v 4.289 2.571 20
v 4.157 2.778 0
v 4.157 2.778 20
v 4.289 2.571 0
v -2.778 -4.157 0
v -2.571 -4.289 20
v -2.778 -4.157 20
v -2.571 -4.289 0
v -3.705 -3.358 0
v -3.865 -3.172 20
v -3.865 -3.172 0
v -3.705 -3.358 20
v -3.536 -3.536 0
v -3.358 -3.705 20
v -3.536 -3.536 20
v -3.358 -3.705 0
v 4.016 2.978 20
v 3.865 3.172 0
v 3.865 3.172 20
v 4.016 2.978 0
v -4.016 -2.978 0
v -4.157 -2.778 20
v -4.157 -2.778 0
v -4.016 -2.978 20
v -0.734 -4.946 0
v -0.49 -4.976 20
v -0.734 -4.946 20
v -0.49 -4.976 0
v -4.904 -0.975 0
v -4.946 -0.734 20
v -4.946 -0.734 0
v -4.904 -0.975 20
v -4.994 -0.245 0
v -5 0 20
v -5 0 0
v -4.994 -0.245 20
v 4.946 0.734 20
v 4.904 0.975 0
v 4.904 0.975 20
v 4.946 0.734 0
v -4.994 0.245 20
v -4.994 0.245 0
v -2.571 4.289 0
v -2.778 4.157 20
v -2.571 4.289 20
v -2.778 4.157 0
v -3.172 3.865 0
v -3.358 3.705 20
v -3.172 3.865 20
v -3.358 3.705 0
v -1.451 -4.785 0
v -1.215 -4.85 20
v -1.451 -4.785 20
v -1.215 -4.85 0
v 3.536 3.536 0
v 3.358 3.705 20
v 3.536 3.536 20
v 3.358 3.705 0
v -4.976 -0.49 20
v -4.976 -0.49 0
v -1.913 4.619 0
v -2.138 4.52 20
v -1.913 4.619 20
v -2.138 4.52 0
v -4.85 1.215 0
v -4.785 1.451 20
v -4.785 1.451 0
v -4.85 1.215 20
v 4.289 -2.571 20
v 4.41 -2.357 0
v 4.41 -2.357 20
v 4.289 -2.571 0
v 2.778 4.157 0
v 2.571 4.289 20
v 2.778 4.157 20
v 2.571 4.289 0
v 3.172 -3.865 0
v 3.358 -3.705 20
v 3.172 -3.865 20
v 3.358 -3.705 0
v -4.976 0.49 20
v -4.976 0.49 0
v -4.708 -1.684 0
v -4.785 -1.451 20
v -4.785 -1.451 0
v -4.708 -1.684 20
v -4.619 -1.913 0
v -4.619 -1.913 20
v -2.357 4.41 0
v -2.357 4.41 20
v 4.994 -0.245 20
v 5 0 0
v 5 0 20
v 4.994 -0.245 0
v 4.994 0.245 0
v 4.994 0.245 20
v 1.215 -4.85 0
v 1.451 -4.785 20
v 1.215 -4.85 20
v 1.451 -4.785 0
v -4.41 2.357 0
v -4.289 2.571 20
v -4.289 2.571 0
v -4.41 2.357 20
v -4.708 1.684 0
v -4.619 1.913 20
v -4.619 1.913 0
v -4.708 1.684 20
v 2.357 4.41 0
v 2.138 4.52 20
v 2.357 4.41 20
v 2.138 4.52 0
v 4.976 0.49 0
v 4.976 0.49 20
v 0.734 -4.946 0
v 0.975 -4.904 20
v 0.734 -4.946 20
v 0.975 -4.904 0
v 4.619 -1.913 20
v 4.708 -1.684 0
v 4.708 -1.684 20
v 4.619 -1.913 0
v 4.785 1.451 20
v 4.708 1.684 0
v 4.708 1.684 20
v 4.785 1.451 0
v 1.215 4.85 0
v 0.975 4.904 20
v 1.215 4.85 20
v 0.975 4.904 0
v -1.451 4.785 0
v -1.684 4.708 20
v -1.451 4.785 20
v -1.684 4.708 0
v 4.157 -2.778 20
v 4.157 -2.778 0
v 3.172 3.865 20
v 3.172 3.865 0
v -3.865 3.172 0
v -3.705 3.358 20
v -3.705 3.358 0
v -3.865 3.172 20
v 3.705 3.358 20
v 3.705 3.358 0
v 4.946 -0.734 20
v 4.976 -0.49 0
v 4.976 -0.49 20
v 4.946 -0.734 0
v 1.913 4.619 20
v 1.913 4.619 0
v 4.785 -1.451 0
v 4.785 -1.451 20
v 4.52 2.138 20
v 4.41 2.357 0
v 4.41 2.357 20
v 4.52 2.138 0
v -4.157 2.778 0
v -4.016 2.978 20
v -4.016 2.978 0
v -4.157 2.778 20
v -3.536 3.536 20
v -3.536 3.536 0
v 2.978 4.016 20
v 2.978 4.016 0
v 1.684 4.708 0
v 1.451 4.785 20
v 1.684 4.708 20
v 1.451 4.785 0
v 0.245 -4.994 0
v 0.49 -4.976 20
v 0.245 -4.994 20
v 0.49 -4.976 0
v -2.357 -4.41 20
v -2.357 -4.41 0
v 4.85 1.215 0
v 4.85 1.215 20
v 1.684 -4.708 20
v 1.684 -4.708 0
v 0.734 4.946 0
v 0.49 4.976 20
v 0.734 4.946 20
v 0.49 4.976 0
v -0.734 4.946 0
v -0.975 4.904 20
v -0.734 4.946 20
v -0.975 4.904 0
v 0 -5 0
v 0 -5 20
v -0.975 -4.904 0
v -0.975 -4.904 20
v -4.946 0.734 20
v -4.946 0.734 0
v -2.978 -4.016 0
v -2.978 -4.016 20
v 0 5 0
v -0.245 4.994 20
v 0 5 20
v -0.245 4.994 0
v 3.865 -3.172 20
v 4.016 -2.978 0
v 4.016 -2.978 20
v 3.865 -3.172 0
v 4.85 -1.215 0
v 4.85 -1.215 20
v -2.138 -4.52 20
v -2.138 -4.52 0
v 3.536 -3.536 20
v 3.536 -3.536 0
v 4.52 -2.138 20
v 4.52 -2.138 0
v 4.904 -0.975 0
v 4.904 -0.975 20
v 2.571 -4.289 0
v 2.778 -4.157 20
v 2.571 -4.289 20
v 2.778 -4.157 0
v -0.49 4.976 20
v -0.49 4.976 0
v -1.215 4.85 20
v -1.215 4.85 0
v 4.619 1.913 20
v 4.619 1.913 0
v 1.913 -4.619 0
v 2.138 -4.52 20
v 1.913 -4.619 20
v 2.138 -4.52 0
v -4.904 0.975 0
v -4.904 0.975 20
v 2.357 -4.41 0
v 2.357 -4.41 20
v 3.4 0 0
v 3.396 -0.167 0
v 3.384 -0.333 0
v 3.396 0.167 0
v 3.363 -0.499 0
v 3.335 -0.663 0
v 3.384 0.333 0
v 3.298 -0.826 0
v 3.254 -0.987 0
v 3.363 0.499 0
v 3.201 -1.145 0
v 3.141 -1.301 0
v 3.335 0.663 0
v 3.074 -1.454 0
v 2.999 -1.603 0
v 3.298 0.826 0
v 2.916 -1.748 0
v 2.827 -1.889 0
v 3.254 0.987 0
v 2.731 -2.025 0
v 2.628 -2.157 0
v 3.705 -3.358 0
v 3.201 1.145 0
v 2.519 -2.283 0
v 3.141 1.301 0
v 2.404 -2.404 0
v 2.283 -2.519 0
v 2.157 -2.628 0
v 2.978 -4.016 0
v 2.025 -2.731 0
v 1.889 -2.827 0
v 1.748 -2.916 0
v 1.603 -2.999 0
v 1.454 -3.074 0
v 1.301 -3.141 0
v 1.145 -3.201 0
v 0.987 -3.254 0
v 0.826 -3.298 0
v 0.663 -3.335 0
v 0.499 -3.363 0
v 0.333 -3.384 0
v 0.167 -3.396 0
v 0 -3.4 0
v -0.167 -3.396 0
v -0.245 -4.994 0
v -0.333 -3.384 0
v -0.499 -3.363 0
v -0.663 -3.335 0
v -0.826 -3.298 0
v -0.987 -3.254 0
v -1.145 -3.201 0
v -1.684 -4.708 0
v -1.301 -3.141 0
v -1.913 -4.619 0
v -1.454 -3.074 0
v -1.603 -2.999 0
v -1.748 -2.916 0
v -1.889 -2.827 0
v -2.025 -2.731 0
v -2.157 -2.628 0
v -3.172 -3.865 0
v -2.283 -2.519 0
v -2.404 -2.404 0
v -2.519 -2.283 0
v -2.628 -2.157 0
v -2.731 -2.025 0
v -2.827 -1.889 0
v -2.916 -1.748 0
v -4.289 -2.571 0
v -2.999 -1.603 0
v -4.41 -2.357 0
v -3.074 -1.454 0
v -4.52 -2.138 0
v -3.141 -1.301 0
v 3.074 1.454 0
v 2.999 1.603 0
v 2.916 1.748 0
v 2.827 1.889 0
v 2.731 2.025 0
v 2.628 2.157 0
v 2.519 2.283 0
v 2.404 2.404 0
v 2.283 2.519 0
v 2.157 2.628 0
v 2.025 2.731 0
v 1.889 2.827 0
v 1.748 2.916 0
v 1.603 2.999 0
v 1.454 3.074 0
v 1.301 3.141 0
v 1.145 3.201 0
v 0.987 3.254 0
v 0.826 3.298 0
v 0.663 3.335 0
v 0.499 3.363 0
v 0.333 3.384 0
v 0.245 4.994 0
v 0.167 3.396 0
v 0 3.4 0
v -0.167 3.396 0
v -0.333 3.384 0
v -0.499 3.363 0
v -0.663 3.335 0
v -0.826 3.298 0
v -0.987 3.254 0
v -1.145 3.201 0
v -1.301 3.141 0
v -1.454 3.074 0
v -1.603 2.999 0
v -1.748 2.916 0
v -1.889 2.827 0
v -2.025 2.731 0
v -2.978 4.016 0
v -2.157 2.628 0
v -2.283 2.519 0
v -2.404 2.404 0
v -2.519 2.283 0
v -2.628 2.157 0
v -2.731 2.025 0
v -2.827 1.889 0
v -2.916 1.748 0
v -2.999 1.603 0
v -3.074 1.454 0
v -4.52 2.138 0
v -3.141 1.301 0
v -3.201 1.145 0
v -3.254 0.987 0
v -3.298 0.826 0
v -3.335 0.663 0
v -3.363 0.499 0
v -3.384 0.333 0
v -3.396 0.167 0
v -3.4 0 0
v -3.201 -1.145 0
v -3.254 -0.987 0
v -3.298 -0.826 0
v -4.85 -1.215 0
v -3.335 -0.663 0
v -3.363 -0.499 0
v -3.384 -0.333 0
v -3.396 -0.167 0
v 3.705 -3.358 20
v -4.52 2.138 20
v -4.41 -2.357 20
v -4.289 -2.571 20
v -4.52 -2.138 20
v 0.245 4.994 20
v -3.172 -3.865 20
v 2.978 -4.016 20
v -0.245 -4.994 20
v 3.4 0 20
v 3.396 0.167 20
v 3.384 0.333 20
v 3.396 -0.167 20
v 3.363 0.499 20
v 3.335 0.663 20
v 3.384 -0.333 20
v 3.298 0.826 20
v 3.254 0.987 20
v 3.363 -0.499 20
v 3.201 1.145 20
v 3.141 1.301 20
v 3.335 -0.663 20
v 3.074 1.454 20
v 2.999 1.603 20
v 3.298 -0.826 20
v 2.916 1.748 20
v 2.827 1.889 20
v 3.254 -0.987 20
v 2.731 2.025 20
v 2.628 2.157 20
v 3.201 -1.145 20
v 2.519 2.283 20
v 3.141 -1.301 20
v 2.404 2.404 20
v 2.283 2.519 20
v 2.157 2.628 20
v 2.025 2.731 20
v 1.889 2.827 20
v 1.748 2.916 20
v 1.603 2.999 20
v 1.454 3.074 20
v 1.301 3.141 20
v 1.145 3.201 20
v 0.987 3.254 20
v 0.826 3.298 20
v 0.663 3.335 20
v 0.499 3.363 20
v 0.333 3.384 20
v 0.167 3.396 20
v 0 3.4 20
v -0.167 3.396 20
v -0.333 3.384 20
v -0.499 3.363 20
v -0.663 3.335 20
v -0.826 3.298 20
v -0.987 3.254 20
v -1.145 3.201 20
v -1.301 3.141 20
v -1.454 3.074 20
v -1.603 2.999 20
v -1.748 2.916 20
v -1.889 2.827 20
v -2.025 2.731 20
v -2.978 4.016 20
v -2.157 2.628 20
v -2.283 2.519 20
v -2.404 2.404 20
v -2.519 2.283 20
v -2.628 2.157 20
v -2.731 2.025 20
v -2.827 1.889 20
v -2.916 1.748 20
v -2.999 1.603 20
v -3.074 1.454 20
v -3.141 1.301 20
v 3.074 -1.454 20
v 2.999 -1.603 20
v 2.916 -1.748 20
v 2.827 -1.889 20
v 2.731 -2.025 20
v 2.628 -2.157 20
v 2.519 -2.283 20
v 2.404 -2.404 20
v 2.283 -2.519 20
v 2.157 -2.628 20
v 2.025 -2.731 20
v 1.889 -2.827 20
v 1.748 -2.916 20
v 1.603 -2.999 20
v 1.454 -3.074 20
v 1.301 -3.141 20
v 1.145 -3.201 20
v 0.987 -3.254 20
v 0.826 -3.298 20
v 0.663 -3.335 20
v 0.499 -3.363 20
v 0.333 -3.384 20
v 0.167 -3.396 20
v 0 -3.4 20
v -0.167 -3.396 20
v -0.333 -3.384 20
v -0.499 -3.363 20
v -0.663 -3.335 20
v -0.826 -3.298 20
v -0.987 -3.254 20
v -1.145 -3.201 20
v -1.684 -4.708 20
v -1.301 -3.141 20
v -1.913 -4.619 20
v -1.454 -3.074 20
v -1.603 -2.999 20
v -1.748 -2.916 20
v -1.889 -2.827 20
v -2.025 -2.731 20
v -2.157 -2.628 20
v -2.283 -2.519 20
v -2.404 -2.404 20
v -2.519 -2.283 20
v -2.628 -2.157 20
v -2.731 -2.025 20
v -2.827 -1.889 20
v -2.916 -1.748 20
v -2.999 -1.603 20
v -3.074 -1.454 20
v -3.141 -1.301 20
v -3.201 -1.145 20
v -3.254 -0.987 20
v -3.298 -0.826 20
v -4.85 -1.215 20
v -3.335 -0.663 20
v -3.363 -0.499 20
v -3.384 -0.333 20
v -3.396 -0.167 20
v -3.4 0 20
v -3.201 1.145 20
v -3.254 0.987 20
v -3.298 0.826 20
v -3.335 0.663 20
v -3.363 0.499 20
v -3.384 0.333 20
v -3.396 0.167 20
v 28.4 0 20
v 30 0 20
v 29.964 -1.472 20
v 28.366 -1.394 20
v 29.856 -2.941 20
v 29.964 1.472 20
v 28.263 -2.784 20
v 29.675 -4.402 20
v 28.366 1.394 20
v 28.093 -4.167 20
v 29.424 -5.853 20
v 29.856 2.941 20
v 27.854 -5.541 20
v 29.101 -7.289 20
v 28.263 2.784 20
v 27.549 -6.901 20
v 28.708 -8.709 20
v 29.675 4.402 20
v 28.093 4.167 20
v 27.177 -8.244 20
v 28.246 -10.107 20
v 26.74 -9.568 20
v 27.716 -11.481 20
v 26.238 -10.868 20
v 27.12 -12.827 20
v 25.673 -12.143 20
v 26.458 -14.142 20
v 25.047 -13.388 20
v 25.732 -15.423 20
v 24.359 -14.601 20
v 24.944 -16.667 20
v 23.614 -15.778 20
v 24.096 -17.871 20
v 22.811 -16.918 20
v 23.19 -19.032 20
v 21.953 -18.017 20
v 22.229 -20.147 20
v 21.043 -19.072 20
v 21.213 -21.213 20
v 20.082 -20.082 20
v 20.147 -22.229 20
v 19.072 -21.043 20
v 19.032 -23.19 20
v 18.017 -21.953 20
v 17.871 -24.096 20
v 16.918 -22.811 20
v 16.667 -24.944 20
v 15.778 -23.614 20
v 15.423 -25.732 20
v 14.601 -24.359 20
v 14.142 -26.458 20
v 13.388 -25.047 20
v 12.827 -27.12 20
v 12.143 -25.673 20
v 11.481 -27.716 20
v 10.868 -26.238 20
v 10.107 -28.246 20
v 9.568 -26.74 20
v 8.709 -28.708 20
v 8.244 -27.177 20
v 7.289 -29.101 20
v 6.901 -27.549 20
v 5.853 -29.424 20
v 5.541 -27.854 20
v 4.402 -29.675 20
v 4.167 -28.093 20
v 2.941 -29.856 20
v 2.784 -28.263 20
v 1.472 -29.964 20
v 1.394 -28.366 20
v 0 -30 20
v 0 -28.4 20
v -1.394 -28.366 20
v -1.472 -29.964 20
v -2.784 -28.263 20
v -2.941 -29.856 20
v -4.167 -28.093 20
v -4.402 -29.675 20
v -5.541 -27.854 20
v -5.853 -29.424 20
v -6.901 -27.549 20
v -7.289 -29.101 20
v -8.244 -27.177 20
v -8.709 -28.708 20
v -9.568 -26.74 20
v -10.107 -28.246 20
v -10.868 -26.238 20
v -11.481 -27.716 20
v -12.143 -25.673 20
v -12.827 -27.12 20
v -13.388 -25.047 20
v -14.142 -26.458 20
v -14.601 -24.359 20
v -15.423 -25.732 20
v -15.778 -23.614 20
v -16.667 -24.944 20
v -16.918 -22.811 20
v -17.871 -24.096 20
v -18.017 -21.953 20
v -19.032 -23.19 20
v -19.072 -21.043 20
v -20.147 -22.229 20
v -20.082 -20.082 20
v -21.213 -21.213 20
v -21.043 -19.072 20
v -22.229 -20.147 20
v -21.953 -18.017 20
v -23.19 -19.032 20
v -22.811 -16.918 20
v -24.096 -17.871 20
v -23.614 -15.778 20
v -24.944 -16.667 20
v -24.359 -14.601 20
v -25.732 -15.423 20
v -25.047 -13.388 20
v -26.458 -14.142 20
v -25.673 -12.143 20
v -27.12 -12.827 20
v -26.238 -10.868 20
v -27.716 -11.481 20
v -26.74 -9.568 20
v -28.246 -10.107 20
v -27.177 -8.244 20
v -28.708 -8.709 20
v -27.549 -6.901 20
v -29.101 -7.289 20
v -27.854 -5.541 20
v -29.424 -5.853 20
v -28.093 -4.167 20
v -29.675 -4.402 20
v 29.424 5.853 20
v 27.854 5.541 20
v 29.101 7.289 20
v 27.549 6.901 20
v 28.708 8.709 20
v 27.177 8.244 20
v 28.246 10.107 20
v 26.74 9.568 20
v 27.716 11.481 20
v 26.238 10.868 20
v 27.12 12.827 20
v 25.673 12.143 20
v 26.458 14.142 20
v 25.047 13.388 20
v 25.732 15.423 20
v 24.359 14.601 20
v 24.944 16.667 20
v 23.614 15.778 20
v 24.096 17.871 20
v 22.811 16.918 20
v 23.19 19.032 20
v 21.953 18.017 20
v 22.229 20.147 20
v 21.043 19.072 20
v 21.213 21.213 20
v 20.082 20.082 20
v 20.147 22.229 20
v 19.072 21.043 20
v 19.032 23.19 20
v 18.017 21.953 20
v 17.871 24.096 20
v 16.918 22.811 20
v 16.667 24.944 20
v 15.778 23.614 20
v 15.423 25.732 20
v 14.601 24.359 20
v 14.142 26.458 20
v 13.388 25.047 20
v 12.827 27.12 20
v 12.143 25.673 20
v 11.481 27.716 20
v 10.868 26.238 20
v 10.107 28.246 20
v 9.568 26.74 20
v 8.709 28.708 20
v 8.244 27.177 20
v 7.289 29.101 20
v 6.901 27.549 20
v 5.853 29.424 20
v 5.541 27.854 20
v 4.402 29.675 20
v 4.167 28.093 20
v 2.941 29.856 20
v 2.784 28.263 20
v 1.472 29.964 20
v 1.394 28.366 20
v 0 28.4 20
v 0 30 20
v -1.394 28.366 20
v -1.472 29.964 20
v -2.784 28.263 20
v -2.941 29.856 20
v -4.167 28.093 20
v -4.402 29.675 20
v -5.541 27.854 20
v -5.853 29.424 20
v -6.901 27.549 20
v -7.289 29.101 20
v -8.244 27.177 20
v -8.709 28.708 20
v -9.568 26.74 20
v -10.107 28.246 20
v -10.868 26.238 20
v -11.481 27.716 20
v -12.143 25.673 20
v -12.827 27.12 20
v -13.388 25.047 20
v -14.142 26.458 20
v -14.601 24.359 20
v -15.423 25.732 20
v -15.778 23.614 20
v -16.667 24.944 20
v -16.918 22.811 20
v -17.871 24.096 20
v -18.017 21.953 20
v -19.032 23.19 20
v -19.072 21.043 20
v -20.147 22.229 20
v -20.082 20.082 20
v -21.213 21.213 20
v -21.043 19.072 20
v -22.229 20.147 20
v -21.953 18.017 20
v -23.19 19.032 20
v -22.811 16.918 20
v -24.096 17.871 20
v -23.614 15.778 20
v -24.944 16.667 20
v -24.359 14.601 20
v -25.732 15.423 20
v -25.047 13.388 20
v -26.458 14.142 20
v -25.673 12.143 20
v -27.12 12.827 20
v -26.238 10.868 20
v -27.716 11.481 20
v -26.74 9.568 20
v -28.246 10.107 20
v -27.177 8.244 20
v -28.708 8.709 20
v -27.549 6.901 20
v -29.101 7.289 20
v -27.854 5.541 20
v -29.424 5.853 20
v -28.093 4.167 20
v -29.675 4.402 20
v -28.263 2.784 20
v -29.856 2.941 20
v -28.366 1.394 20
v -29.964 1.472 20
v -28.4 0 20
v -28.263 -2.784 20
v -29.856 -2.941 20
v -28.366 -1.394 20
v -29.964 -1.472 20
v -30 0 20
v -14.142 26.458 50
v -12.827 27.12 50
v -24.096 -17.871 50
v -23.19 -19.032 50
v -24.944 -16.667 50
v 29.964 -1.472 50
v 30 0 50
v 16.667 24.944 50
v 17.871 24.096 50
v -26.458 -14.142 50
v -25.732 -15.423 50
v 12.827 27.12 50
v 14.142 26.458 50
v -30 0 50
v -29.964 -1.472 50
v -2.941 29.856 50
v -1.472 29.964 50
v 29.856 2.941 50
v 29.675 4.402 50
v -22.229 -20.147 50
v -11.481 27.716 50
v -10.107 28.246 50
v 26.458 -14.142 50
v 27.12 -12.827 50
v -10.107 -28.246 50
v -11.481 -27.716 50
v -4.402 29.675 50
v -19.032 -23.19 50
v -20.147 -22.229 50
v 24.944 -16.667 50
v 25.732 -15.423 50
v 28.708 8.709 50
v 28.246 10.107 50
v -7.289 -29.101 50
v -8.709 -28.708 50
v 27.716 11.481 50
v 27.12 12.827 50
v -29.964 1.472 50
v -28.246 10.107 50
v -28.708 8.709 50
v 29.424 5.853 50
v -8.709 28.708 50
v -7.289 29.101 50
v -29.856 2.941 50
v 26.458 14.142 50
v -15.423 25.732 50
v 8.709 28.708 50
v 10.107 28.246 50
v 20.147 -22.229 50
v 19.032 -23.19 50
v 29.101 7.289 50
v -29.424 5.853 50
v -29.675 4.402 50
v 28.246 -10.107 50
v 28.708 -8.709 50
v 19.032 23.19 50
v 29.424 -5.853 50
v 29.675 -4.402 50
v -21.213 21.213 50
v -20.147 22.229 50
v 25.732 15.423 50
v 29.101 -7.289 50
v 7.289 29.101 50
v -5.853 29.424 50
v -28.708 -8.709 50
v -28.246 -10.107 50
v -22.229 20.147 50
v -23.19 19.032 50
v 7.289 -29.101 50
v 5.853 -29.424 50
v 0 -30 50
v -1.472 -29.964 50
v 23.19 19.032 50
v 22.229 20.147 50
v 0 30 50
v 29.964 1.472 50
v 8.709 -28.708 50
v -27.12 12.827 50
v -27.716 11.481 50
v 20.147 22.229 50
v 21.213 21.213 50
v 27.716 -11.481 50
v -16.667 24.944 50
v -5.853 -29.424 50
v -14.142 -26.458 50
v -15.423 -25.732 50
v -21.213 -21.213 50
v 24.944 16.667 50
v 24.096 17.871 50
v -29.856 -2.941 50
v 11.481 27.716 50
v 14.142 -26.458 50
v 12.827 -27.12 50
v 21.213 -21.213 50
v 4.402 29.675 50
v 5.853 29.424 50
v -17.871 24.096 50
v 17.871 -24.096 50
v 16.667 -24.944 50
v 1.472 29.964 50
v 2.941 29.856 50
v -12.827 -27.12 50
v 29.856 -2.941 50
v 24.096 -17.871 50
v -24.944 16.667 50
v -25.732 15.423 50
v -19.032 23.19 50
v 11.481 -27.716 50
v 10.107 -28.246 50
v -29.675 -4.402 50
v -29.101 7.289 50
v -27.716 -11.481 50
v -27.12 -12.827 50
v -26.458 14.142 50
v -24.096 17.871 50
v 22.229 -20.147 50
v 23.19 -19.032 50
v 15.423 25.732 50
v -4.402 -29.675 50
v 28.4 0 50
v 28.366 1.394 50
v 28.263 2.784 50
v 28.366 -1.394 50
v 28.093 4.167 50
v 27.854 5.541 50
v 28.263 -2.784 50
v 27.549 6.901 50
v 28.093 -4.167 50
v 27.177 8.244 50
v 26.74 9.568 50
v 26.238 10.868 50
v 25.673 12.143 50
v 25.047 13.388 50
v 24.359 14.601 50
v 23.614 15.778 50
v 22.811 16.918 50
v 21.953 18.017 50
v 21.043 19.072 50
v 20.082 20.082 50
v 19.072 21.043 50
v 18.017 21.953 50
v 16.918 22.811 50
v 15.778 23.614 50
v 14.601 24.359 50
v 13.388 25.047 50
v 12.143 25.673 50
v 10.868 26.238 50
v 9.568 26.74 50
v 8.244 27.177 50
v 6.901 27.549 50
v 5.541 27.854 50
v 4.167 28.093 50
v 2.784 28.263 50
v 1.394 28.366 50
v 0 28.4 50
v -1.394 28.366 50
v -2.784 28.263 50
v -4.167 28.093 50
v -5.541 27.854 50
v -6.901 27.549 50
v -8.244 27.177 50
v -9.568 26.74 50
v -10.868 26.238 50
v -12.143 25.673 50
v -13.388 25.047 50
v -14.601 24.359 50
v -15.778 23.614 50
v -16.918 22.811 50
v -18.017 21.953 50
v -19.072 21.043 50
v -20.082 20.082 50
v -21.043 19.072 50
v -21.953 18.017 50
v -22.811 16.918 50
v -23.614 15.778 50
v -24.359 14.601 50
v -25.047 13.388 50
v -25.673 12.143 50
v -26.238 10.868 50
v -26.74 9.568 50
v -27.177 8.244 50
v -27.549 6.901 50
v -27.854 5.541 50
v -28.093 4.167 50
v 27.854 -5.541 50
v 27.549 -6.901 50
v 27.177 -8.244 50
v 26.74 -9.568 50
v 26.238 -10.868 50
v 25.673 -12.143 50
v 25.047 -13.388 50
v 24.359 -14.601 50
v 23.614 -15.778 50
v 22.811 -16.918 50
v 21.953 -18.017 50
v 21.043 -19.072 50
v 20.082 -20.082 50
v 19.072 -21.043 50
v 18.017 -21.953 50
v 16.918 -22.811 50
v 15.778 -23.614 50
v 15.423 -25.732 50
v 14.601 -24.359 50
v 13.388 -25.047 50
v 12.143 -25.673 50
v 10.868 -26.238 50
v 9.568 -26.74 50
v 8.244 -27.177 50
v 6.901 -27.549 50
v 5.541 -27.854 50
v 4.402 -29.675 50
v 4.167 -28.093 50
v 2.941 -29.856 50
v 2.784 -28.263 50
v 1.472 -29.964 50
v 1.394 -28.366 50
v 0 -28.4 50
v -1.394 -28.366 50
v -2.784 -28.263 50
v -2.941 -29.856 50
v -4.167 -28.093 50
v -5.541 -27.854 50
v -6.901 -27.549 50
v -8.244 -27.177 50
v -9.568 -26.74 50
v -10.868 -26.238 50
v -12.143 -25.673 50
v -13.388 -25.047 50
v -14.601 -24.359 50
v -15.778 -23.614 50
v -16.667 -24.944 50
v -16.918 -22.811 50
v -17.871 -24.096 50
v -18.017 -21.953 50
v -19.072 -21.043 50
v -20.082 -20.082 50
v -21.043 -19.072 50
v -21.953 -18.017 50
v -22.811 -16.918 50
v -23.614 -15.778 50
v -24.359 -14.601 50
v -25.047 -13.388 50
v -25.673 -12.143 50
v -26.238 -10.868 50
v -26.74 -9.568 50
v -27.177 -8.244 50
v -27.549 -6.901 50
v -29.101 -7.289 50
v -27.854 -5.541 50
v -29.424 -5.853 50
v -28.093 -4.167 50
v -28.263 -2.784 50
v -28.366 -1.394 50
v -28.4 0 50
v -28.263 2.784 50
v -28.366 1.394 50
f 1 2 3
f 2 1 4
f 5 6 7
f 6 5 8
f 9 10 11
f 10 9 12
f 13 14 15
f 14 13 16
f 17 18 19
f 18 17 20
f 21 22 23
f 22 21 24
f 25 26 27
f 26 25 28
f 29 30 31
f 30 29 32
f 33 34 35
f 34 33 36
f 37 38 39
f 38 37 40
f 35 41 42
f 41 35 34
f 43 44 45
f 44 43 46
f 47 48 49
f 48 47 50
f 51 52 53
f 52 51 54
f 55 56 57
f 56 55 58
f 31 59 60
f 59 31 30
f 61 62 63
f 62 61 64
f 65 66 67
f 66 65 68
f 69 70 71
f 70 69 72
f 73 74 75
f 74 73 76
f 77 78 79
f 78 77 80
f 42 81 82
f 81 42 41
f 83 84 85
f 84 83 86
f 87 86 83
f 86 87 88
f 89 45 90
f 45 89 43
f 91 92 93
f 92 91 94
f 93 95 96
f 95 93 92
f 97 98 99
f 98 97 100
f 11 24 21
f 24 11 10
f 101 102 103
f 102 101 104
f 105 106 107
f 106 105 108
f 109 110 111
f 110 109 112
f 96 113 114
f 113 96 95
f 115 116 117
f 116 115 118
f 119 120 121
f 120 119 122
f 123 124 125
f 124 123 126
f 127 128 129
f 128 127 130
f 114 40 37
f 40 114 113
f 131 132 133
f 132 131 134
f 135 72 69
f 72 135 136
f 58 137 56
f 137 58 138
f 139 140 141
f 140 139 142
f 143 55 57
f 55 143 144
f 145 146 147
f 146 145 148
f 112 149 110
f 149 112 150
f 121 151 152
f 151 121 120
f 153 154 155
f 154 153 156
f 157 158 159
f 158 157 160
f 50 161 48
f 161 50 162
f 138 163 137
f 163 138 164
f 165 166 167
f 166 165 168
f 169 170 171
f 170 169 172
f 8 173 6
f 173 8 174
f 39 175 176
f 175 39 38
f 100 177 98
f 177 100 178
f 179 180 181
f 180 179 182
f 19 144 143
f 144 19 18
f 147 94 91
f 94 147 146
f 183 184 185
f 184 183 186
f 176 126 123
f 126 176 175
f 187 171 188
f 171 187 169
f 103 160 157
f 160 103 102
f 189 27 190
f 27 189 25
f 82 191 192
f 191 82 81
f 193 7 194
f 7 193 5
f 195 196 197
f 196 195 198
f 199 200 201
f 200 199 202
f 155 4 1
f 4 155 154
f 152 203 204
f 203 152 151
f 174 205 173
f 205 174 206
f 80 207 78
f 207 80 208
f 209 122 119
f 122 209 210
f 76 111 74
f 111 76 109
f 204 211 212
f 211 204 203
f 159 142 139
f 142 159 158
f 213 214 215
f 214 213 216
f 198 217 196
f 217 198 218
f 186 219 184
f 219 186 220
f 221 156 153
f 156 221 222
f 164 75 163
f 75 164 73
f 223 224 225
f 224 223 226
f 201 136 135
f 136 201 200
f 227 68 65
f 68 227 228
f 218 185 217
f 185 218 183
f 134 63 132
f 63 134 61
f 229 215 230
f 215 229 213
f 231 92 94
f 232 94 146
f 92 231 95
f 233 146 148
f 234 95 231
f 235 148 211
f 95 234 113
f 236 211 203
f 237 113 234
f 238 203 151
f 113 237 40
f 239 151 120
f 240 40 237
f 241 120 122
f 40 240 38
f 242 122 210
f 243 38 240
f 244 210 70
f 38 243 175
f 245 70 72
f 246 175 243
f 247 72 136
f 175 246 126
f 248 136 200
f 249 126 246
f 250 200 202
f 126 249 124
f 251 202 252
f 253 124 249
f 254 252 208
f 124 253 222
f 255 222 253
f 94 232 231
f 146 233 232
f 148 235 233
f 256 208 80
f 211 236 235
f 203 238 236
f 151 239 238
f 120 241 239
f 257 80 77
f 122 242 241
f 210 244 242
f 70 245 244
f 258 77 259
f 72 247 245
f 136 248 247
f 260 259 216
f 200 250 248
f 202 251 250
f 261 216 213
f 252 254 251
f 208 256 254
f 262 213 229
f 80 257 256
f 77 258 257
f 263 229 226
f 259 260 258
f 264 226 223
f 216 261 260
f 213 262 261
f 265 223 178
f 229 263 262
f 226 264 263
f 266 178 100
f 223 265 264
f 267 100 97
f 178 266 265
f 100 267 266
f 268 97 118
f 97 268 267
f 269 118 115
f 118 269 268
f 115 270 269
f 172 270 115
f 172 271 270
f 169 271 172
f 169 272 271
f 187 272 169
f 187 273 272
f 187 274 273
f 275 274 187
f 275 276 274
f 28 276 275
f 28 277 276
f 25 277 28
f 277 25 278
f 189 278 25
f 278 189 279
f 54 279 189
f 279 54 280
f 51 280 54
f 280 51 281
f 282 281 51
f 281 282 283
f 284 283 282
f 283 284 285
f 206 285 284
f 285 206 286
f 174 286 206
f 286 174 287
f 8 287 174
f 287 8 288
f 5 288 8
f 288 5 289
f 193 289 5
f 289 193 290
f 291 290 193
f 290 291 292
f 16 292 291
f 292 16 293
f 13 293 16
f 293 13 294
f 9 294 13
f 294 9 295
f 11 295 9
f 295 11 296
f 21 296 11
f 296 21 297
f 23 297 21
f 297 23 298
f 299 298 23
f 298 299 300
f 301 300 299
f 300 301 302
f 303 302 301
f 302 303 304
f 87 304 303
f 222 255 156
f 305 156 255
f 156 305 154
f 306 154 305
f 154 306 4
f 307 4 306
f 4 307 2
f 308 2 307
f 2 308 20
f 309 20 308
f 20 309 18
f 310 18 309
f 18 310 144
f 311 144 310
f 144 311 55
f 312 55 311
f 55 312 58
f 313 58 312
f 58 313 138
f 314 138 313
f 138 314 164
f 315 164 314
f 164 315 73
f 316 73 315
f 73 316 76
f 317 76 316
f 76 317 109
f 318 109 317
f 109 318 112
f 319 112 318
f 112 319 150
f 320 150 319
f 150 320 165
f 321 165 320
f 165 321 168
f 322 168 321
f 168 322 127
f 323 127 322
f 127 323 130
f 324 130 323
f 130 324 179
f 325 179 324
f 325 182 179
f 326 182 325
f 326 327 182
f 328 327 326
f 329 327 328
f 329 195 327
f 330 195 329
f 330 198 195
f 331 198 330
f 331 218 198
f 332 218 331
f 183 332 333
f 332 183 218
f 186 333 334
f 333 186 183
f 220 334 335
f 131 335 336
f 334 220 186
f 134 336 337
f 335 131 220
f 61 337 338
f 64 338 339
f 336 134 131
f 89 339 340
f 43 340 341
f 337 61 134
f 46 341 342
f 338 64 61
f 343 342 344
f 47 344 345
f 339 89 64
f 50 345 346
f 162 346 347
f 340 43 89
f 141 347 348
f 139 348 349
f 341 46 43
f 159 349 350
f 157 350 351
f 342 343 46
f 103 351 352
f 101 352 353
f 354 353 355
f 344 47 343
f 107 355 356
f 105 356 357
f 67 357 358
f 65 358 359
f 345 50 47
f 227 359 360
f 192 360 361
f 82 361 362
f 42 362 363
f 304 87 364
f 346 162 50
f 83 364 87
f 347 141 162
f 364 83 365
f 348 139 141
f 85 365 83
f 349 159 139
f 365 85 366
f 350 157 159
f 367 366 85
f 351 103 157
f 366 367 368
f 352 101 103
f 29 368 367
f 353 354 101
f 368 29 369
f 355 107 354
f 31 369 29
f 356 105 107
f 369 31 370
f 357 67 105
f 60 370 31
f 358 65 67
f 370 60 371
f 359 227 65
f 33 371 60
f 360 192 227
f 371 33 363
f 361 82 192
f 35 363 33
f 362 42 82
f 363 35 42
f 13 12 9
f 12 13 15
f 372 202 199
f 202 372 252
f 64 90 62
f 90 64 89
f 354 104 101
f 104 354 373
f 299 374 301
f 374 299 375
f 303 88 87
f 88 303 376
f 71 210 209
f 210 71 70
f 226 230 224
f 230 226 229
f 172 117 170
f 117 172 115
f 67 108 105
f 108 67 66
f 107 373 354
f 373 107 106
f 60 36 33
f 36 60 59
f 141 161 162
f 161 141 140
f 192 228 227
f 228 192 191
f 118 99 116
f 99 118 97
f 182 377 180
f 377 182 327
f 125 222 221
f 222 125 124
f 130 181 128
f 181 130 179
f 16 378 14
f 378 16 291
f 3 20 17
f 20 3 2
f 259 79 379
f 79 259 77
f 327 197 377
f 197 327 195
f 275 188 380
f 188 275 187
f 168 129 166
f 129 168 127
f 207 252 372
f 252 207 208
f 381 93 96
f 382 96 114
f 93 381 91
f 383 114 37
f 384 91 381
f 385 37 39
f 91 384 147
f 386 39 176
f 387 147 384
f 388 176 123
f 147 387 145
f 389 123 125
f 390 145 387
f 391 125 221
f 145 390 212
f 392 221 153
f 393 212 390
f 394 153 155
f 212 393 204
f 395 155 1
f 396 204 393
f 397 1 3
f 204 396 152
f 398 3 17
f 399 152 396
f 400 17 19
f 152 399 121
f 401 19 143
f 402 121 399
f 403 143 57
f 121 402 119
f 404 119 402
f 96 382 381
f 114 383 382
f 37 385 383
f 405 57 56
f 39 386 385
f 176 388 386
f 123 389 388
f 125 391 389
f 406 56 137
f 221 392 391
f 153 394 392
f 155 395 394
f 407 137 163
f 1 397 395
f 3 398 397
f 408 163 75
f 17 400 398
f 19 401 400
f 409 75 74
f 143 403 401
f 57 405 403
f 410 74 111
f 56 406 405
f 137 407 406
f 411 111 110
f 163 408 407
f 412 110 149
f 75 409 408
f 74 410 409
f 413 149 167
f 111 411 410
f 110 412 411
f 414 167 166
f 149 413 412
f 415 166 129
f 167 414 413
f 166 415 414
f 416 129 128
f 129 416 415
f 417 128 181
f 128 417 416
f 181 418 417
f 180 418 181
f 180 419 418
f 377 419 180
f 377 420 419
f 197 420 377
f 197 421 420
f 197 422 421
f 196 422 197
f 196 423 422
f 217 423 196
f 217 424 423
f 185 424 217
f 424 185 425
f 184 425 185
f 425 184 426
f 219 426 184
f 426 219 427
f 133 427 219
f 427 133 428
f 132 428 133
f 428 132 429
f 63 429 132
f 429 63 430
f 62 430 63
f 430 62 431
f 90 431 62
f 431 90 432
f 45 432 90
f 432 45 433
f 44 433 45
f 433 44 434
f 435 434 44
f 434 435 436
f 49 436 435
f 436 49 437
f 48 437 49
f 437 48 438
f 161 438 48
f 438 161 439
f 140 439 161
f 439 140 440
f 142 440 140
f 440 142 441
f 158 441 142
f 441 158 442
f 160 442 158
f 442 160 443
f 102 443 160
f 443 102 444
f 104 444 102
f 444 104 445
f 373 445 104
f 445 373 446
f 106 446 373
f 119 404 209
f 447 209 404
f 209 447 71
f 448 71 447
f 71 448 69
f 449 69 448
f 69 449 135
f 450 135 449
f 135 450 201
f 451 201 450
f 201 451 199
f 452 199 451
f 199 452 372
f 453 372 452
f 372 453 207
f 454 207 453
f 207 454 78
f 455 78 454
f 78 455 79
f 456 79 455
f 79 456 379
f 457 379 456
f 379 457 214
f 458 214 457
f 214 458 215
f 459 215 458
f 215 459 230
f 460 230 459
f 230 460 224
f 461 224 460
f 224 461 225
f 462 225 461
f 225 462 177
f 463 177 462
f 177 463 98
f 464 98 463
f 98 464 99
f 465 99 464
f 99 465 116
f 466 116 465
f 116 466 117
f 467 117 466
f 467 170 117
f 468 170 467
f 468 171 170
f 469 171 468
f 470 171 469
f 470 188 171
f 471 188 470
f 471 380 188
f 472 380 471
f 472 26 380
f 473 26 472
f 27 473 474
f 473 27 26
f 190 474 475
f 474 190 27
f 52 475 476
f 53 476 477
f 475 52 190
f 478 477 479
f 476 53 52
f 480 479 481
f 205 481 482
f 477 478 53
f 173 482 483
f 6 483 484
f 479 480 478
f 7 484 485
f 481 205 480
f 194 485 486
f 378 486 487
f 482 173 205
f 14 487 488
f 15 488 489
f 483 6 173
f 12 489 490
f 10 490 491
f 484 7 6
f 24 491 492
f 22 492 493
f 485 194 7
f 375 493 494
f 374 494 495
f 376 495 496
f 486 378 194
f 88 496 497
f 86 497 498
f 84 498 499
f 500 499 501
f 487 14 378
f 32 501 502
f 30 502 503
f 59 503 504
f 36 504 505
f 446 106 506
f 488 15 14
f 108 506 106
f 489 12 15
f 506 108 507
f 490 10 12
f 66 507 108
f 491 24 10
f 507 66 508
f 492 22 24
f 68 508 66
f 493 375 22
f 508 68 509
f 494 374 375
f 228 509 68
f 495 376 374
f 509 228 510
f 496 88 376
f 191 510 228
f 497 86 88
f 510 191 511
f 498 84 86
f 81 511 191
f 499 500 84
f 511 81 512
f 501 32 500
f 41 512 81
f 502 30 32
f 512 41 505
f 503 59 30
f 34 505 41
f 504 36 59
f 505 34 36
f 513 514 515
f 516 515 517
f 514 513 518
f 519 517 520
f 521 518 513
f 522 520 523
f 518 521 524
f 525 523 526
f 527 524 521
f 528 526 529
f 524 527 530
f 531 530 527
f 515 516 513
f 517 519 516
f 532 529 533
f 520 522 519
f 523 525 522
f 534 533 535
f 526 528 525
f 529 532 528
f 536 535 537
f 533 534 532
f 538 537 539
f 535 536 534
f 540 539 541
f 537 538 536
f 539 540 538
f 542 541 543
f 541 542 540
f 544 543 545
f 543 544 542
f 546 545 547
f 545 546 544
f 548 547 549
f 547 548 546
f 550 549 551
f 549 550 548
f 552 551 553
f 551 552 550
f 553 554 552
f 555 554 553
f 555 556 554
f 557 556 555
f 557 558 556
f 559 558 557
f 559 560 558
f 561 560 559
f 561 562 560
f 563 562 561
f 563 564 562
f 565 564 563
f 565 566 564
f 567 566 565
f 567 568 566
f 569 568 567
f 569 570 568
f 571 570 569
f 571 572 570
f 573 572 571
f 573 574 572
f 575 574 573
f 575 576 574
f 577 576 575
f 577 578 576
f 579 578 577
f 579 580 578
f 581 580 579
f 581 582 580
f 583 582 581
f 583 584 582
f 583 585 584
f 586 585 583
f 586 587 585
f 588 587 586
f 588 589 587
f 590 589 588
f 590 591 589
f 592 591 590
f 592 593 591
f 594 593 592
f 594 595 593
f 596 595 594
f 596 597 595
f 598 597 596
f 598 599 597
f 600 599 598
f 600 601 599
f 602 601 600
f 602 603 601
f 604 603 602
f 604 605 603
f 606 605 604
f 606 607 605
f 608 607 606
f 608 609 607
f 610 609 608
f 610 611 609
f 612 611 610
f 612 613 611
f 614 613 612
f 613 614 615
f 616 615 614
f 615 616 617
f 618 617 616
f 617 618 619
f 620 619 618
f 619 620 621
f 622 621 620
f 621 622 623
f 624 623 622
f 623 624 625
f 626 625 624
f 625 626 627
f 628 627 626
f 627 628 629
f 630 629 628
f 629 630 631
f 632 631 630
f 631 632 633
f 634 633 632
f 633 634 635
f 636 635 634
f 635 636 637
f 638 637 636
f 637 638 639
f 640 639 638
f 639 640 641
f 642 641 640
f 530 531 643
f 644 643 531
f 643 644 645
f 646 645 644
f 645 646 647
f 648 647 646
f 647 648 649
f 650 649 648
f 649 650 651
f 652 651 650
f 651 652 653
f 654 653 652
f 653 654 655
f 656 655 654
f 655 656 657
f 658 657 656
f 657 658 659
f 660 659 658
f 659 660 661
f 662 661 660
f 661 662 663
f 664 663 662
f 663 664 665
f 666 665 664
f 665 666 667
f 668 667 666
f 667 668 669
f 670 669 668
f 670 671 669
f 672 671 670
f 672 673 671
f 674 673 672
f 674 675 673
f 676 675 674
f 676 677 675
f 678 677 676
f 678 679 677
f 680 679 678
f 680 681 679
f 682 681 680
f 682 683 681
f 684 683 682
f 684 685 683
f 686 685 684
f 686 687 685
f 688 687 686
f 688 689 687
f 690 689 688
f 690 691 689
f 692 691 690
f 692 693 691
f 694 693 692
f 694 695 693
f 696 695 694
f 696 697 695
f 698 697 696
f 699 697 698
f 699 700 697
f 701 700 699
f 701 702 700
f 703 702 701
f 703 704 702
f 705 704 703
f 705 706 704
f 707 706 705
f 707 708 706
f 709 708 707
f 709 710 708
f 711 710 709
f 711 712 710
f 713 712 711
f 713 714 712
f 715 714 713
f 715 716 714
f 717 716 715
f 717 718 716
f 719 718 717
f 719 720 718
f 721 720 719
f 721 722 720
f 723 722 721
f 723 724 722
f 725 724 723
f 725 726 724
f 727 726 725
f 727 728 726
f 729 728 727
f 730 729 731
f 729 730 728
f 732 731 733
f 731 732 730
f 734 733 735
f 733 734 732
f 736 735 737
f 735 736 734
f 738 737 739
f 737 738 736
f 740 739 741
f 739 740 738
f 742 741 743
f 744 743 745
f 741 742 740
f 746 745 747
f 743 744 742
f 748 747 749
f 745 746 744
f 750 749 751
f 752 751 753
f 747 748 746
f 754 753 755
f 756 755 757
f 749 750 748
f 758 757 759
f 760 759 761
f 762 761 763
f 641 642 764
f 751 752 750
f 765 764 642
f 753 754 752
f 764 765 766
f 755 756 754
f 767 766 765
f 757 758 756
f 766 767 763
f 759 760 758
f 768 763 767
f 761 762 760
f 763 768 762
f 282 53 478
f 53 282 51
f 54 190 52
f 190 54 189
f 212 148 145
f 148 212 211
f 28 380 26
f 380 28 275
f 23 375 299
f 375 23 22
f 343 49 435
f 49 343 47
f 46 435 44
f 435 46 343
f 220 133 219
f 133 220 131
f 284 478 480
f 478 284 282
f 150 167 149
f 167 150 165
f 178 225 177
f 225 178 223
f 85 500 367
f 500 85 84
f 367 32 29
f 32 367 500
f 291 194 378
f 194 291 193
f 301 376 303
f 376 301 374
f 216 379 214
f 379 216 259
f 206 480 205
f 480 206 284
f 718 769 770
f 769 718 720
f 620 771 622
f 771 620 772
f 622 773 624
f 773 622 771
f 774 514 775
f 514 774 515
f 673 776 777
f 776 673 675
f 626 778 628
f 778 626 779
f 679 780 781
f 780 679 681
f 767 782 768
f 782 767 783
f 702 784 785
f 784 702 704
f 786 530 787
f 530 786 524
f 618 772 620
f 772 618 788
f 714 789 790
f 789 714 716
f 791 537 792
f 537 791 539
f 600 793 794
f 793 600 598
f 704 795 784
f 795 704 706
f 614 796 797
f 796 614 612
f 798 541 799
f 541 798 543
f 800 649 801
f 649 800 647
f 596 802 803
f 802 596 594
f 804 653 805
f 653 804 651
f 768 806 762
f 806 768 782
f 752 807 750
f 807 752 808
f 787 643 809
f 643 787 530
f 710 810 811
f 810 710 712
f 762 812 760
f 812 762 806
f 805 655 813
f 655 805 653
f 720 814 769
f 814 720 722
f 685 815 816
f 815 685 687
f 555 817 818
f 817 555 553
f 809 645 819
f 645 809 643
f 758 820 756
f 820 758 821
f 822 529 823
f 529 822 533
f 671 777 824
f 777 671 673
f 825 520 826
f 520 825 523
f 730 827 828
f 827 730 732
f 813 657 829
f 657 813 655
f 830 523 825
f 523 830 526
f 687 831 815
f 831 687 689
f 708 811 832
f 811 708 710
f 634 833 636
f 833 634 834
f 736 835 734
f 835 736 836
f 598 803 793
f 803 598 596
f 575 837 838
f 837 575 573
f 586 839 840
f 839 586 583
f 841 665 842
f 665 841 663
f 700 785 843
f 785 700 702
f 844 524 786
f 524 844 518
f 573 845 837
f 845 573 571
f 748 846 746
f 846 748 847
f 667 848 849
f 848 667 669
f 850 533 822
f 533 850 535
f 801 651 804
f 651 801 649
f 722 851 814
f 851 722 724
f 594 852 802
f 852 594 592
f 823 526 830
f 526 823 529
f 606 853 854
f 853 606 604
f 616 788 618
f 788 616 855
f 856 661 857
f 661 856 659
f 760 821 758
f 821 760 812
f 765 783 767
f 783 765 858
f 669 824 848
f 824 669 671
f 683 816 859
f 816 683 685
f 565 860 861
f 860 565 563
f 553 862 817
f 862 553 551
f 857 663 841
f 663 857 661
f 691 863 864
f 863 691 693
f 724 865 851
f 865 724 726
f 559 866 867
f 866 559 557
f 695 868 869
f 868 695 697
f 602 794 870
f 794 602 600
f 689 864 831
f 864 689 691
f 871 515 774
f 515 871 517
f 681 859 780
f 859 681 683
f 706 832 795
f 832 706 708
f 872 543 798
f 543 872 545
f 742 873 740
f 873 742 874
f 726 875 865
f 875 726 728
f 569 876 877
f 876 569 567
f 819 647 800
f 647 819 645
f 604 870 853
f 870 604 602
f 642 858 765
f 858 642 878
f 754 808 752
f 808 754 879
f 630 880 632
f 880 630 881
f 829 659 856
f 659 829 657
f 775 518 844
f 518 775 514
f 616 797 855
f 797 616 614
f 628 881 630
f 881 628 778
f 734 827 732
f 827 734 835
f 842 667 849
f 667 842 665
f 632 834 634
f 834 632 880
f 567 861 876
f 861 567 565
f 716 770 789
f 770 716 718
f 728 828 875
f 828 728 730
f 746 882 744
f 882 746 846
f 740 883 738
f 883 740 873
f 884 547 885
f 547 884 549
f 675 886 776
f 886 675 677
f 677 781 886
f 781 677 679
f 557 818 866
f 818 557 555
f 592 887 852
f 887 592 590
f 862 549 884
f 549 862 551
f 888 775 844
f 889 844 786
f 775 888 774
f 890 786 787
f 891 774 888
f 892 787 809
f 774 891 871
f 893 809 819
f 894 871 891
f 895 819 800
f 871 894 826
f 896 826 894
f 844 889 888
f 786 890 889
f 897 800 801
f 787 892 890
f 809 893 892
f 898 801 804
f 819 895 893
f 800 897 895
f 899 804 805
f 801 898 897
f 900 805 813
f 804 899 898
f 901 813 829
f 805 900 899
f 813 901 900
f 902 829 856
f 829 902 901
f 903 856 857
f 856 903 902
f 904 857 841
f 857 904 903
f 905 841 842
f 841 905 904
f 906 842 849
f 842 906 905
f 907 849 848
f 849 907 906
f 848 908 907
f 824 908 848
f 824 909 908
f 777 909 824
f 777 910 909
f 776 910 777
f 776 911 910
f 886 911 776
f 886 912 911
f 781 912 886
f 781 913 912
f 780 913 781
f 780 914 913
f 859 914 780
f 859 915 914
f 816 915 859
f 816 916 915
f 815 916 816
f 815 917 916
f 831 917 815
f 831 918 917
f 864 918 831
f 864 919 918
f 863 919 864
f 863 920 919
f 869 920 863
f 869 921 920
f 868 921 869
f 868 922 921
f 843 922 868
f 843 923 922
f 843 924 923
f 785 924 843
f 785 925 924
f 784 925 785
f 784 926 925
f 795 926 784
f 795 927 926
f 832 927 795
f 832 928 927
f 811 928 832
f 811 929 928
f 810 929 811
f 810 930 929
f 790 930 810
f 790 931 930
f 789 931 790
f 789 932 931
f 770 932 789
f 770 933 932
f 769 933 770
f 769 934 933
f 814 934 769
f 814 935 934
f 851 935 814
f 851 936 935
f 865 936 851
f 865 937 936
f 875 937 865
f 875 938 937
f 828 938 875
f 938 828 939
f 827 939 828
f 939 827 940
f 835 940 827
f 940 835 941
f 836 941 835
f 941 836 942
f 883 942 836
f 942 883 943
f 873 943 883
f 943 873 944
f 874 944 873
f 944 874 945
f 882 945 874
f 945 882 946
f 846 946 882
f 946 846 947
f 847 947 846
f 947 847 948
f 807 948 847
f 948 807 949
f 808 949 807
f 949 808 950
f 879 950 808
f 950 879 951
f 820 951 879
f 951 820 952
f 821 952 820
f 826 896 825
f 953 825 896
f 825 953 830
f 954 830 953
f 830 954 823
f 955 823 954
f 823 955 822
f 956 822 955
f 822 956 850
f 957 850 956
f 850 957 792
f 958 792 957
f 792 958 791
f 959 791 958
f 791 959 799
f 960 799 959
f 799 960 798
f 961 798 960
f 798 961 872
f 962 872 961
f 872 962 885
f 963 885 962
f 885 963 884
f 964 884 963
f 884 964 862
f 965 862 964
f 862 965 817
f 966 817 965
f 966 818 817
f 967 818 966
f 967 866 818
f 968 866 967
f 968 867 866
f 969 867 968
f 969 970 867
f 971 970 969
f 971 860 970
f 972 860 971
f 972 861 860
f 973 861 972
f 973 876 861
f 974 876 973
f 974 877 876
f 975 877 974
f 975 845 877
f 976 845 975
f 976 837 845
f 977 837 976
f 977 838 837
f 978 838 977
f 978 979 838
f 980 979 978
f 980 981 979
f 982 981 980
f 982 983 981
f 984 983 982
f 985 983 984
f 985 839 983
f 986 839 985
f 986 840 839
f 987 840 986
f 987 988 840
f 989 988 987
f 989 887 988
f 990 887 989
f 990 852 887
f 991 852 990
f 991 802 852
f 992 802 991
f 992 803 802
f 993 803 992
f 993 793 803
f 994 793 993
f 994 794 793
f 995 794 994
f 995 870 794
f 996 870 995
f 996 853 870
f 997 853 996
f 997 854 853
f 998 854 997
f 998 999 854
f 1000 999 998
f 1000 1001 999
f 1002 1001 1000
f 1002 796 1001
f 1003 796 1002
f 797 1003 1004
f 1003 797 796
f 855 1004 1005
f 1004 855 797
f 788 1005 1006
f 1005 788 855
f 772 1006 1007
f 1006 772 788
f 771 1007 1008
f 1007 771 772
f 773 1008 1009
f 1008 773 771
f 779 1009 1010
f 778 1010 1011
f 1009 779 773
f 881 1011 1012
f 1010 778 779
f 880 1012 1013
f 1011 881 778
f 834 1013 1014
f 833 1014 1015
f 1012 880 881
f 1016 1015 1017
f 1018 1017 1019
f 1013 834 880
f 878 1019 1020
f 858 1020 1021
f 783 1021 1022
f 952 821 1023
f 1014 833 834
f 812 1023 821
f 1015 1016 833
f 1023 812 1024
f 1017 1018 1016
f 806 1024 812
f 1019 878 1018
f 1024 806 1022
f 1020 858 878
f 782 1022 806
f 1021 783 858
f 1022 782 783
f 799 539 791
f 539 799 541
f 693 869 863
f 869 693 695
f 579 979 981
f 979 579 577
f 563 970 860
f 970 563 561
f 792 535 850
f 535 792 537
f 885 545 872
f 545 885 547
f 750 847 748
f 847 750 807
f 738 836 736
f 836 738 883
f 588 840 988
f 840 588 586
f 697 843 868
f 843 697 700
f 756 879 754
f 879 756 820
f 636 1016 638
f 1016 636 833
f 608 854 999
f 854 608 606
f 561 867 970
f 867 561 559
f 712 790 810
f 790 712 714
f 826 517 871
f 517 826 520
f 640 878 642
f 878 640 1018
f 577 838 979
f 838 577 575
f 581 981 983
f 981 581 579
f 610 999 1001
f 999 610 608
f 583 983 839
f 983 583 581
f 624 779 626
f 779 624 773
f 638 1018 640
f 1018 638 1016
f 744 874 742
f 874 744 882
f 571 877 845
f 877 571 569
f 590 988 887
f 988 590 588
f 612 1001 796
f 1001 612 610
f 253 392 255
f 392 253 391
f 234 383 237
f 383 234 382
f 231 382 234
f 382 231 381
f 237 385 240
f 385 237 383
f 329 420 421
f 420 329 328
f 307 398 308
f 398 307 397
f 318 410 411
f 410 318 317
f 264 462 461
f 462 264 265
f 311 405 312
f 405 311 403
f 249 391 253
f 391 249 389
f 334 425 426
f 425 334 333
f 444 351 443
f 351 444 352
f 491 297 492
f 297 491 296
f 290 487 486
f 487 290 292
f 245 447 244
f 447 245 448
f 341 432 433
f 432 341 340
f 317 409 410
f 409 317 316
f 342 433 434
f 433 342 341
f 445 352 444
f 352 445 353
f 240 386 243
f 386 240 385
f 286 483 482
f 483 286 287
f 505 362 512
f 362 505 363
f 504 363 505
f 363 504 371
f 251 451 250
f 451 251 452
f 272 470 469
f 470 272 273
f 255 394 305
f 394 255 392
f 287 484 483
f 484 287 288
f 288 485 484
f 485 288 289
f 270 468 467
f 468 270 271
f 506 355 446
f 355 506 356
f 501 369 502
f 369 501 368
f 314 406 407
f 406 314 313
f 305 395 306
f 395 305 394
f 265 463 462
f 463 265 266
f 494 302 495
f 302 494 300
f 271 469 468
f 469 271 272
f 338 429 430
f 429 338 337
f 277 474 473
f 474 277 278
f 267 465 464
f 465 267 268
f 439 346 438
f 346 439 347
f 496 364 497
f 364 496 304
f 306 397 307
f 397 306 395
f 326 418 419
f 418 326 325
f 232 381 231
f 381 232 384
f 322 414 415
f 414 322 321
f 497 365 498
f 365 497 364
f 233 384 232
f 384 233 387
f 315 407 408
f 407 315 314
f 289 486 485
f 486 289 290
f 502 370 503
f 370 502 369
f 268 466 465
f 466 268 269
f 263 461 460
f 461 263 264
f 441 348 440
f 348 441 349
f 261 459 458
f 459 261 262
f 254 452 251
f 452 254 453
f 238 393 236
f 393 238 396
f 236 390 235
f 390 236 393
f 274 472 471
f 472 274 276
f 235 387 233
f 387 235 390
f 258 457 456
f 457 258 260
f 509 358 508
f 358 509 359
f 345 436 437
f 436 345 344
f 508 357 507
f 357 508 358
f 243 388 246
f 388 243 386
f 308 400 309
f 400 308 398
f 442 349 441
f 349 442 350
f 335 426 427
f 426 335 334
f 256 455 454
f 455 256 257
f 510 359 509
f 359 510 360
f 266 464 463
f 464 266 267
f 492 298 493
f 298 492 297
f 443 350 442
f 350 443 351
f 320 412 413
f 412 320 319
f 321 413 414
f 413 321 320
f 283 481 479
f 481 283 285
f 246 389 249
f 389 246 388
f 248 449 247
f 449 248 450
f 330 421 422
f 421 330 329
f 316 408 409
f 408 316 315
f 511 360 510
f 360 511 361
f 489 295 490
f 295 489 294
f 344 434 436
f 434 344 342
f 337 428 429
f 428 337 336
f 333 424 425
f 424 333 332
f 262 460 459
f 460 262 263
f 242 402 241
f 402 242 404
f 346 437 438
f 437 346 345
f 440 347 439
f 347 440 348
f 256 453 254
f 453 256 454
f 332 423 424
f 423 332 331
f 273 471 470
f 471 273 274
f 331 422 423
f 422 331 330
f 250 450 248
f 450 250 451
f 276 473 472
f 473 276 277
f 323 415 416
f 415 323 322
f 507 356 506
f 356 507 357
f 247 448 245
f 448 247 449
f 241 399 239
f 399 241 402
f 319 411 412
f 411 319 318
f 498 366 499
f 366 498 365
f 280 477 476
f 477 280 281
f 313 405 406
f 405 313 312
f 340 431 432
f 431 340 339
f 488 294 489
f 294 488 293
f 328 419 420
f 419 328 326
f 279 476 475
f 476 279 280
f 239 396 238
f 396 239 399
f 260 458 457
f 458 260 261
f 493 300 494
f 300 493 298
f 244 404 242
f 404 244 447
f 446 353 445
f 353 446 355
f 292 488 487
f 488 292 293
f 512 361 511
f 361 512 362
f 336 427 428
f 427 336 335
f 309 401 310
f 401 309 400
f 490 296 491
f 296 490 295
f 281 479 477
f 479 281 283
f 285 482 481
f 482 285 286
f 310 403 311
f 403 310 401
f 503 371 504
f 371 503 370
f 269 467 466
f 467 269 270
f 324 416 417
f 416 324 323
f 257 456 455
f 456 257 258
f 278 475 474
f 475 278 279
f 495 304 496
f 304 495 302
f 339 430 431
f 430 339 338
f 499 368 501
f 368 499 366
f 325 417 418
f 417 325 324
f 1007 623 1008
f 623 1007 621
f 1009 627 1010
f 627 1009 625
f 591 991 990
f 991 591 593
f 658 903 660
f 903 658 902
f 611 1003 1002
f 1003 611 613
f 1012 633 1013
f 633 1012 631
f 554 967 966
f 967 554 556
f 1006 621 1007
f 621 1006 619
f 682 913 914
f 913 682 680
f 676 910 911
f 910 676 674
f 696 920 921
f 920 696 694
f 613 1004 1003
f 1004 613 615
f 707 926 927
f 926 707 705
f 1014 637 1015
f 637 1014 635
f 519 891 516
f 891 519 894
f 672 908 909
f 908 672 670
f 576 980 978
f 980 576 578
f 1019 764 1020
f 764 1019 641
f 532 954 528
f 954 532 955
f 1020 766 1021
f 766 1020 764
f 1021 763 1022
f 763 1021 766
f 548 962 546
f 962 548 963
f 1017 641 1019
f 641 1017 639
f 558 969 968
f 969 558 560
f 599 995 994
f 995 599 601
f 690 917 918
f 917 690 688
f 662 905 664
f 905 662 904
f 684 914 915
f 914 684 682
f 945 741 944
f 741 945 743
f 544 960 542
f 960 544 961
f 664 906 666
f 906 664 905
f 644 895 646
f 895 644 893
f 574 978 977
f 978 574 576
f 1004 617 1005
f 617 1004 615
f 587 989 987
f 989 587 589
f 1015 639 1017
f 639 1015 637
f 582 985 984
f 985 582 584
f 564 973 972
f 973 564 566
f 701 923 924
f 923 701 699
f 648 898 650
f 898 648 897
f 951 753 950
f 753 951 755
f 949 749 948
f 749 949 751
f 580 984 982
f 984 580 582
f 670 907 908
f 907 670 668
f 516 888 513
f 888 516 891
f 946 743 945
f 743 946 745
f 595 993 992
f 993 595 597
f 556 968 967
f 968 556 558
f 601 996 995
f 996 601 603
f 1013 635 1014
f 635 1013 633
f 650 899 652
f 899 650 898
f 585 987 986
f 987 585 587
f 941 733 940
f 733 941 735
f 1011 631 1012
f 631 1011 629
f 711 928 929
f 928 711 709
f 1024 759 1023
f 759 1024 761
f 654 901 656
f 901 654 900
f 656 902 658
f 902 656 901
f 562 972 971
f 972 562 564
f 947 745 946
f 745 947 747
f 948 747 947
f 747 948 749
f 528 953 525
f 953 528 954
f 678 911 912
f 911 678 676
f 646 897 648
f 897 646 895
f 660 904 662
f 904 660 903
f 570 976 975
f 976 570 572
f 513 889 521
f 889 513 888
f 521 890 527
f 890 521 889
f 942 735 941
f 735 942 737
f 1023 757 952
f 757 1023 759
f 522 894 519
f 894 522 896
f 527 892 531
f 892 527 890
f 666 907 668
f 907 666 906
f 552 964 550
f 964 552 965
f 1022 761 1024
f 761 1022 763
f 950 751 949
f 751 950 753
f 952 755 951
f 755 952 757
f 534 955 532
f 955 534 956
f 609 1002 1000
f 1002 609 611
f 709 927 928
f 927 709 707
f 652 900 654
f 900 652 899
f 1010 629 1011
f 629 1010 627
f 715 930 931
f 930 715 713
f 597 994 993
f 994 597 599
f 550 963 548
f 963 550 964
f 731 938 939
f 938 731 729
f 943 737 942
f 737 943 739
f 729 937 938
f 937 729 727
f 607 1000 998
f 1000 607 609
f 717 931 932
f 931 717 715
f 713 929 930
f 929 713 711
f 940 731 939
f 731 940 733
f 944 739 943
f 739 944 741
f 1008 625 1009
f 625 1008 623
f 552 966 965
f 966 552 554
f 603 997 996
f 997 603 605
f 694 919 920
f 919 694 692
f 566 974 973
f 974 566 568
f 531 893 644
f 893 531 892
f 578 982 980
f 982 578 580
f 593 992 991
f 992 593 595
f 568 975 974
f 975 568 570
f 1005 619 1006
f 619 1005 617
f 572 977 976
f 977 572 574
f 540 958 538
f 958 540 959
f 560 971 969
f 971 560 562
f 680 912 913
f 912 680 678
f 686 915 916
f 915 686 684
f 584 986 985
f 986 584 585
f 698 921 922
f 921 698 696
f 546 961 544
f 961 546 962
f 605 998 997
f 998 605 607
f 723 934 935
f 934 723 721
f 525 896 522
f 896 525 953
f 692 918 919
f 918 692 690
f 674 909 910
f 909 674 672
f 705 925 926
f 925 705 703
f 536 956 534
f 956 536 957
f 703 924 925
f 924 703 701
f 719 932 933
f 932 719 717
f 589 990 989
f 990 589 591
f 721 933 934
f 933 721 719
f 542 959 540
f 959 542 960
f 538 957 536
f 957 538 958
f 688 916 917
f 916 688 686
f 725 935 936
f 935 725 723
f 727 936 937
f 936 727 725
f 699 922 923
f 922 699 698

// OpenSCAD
// Small Lab Funnel - Corrected Version 2
// Designed for FDM printing: printed upright, spout at bottom.

// --- Dimensions ---
spout_od      = 10.0;    // Outer diameter of the spout (mm)
spout_height  = 20.0;    // Height of the spout (mm)
rim_od        = 60.0;    // Outer diameter at the top rim (mm)
funnel_height = 30.0;    // Height of the conical section (mm)
wall_thick    = 1.6;     // Wall thickness (mm)

// --- Derived Dimensions ---
total_height   = spout_height + funnel_height;
spout_id       = spout_od - (2 * wall_thick);
rim_id         = rim_od - (2 * wall_thick);

$fn = 128;

// --- Geometry Construction ---

module funnel_outer() {
    // Use hull to create the conical frustum smoothly
    union() {
        // The spout
        cylinder(h = spout_height, d = spout_od);
        
        // The conical section
        translate([0, 0, spout_height])
        hull() {
            cylinder(h = 0.01, d = spout_od);
            cylinder(h = funnel_height, d = rim_od);
        }
    }
}

module funnel_inner() {
    // The hollow part
    union() {
        // Spout bore
        translate([0, 0, -1])
            cylinder(h = spout_height + 2, d = spout_id);
        
        // Conical bore
        translate([0, 0, spout_height])
        hull() {
            cylinder(h = 0.01, d = spout_id);
            cylinder(h = funnel_height + 1, d = rim_id);
        }
    }
}

// Final Assembly
difference() {
    // The solid outer shell
    funnel_outer();
    
    // The hollow interior
    funnel_inner();
}
